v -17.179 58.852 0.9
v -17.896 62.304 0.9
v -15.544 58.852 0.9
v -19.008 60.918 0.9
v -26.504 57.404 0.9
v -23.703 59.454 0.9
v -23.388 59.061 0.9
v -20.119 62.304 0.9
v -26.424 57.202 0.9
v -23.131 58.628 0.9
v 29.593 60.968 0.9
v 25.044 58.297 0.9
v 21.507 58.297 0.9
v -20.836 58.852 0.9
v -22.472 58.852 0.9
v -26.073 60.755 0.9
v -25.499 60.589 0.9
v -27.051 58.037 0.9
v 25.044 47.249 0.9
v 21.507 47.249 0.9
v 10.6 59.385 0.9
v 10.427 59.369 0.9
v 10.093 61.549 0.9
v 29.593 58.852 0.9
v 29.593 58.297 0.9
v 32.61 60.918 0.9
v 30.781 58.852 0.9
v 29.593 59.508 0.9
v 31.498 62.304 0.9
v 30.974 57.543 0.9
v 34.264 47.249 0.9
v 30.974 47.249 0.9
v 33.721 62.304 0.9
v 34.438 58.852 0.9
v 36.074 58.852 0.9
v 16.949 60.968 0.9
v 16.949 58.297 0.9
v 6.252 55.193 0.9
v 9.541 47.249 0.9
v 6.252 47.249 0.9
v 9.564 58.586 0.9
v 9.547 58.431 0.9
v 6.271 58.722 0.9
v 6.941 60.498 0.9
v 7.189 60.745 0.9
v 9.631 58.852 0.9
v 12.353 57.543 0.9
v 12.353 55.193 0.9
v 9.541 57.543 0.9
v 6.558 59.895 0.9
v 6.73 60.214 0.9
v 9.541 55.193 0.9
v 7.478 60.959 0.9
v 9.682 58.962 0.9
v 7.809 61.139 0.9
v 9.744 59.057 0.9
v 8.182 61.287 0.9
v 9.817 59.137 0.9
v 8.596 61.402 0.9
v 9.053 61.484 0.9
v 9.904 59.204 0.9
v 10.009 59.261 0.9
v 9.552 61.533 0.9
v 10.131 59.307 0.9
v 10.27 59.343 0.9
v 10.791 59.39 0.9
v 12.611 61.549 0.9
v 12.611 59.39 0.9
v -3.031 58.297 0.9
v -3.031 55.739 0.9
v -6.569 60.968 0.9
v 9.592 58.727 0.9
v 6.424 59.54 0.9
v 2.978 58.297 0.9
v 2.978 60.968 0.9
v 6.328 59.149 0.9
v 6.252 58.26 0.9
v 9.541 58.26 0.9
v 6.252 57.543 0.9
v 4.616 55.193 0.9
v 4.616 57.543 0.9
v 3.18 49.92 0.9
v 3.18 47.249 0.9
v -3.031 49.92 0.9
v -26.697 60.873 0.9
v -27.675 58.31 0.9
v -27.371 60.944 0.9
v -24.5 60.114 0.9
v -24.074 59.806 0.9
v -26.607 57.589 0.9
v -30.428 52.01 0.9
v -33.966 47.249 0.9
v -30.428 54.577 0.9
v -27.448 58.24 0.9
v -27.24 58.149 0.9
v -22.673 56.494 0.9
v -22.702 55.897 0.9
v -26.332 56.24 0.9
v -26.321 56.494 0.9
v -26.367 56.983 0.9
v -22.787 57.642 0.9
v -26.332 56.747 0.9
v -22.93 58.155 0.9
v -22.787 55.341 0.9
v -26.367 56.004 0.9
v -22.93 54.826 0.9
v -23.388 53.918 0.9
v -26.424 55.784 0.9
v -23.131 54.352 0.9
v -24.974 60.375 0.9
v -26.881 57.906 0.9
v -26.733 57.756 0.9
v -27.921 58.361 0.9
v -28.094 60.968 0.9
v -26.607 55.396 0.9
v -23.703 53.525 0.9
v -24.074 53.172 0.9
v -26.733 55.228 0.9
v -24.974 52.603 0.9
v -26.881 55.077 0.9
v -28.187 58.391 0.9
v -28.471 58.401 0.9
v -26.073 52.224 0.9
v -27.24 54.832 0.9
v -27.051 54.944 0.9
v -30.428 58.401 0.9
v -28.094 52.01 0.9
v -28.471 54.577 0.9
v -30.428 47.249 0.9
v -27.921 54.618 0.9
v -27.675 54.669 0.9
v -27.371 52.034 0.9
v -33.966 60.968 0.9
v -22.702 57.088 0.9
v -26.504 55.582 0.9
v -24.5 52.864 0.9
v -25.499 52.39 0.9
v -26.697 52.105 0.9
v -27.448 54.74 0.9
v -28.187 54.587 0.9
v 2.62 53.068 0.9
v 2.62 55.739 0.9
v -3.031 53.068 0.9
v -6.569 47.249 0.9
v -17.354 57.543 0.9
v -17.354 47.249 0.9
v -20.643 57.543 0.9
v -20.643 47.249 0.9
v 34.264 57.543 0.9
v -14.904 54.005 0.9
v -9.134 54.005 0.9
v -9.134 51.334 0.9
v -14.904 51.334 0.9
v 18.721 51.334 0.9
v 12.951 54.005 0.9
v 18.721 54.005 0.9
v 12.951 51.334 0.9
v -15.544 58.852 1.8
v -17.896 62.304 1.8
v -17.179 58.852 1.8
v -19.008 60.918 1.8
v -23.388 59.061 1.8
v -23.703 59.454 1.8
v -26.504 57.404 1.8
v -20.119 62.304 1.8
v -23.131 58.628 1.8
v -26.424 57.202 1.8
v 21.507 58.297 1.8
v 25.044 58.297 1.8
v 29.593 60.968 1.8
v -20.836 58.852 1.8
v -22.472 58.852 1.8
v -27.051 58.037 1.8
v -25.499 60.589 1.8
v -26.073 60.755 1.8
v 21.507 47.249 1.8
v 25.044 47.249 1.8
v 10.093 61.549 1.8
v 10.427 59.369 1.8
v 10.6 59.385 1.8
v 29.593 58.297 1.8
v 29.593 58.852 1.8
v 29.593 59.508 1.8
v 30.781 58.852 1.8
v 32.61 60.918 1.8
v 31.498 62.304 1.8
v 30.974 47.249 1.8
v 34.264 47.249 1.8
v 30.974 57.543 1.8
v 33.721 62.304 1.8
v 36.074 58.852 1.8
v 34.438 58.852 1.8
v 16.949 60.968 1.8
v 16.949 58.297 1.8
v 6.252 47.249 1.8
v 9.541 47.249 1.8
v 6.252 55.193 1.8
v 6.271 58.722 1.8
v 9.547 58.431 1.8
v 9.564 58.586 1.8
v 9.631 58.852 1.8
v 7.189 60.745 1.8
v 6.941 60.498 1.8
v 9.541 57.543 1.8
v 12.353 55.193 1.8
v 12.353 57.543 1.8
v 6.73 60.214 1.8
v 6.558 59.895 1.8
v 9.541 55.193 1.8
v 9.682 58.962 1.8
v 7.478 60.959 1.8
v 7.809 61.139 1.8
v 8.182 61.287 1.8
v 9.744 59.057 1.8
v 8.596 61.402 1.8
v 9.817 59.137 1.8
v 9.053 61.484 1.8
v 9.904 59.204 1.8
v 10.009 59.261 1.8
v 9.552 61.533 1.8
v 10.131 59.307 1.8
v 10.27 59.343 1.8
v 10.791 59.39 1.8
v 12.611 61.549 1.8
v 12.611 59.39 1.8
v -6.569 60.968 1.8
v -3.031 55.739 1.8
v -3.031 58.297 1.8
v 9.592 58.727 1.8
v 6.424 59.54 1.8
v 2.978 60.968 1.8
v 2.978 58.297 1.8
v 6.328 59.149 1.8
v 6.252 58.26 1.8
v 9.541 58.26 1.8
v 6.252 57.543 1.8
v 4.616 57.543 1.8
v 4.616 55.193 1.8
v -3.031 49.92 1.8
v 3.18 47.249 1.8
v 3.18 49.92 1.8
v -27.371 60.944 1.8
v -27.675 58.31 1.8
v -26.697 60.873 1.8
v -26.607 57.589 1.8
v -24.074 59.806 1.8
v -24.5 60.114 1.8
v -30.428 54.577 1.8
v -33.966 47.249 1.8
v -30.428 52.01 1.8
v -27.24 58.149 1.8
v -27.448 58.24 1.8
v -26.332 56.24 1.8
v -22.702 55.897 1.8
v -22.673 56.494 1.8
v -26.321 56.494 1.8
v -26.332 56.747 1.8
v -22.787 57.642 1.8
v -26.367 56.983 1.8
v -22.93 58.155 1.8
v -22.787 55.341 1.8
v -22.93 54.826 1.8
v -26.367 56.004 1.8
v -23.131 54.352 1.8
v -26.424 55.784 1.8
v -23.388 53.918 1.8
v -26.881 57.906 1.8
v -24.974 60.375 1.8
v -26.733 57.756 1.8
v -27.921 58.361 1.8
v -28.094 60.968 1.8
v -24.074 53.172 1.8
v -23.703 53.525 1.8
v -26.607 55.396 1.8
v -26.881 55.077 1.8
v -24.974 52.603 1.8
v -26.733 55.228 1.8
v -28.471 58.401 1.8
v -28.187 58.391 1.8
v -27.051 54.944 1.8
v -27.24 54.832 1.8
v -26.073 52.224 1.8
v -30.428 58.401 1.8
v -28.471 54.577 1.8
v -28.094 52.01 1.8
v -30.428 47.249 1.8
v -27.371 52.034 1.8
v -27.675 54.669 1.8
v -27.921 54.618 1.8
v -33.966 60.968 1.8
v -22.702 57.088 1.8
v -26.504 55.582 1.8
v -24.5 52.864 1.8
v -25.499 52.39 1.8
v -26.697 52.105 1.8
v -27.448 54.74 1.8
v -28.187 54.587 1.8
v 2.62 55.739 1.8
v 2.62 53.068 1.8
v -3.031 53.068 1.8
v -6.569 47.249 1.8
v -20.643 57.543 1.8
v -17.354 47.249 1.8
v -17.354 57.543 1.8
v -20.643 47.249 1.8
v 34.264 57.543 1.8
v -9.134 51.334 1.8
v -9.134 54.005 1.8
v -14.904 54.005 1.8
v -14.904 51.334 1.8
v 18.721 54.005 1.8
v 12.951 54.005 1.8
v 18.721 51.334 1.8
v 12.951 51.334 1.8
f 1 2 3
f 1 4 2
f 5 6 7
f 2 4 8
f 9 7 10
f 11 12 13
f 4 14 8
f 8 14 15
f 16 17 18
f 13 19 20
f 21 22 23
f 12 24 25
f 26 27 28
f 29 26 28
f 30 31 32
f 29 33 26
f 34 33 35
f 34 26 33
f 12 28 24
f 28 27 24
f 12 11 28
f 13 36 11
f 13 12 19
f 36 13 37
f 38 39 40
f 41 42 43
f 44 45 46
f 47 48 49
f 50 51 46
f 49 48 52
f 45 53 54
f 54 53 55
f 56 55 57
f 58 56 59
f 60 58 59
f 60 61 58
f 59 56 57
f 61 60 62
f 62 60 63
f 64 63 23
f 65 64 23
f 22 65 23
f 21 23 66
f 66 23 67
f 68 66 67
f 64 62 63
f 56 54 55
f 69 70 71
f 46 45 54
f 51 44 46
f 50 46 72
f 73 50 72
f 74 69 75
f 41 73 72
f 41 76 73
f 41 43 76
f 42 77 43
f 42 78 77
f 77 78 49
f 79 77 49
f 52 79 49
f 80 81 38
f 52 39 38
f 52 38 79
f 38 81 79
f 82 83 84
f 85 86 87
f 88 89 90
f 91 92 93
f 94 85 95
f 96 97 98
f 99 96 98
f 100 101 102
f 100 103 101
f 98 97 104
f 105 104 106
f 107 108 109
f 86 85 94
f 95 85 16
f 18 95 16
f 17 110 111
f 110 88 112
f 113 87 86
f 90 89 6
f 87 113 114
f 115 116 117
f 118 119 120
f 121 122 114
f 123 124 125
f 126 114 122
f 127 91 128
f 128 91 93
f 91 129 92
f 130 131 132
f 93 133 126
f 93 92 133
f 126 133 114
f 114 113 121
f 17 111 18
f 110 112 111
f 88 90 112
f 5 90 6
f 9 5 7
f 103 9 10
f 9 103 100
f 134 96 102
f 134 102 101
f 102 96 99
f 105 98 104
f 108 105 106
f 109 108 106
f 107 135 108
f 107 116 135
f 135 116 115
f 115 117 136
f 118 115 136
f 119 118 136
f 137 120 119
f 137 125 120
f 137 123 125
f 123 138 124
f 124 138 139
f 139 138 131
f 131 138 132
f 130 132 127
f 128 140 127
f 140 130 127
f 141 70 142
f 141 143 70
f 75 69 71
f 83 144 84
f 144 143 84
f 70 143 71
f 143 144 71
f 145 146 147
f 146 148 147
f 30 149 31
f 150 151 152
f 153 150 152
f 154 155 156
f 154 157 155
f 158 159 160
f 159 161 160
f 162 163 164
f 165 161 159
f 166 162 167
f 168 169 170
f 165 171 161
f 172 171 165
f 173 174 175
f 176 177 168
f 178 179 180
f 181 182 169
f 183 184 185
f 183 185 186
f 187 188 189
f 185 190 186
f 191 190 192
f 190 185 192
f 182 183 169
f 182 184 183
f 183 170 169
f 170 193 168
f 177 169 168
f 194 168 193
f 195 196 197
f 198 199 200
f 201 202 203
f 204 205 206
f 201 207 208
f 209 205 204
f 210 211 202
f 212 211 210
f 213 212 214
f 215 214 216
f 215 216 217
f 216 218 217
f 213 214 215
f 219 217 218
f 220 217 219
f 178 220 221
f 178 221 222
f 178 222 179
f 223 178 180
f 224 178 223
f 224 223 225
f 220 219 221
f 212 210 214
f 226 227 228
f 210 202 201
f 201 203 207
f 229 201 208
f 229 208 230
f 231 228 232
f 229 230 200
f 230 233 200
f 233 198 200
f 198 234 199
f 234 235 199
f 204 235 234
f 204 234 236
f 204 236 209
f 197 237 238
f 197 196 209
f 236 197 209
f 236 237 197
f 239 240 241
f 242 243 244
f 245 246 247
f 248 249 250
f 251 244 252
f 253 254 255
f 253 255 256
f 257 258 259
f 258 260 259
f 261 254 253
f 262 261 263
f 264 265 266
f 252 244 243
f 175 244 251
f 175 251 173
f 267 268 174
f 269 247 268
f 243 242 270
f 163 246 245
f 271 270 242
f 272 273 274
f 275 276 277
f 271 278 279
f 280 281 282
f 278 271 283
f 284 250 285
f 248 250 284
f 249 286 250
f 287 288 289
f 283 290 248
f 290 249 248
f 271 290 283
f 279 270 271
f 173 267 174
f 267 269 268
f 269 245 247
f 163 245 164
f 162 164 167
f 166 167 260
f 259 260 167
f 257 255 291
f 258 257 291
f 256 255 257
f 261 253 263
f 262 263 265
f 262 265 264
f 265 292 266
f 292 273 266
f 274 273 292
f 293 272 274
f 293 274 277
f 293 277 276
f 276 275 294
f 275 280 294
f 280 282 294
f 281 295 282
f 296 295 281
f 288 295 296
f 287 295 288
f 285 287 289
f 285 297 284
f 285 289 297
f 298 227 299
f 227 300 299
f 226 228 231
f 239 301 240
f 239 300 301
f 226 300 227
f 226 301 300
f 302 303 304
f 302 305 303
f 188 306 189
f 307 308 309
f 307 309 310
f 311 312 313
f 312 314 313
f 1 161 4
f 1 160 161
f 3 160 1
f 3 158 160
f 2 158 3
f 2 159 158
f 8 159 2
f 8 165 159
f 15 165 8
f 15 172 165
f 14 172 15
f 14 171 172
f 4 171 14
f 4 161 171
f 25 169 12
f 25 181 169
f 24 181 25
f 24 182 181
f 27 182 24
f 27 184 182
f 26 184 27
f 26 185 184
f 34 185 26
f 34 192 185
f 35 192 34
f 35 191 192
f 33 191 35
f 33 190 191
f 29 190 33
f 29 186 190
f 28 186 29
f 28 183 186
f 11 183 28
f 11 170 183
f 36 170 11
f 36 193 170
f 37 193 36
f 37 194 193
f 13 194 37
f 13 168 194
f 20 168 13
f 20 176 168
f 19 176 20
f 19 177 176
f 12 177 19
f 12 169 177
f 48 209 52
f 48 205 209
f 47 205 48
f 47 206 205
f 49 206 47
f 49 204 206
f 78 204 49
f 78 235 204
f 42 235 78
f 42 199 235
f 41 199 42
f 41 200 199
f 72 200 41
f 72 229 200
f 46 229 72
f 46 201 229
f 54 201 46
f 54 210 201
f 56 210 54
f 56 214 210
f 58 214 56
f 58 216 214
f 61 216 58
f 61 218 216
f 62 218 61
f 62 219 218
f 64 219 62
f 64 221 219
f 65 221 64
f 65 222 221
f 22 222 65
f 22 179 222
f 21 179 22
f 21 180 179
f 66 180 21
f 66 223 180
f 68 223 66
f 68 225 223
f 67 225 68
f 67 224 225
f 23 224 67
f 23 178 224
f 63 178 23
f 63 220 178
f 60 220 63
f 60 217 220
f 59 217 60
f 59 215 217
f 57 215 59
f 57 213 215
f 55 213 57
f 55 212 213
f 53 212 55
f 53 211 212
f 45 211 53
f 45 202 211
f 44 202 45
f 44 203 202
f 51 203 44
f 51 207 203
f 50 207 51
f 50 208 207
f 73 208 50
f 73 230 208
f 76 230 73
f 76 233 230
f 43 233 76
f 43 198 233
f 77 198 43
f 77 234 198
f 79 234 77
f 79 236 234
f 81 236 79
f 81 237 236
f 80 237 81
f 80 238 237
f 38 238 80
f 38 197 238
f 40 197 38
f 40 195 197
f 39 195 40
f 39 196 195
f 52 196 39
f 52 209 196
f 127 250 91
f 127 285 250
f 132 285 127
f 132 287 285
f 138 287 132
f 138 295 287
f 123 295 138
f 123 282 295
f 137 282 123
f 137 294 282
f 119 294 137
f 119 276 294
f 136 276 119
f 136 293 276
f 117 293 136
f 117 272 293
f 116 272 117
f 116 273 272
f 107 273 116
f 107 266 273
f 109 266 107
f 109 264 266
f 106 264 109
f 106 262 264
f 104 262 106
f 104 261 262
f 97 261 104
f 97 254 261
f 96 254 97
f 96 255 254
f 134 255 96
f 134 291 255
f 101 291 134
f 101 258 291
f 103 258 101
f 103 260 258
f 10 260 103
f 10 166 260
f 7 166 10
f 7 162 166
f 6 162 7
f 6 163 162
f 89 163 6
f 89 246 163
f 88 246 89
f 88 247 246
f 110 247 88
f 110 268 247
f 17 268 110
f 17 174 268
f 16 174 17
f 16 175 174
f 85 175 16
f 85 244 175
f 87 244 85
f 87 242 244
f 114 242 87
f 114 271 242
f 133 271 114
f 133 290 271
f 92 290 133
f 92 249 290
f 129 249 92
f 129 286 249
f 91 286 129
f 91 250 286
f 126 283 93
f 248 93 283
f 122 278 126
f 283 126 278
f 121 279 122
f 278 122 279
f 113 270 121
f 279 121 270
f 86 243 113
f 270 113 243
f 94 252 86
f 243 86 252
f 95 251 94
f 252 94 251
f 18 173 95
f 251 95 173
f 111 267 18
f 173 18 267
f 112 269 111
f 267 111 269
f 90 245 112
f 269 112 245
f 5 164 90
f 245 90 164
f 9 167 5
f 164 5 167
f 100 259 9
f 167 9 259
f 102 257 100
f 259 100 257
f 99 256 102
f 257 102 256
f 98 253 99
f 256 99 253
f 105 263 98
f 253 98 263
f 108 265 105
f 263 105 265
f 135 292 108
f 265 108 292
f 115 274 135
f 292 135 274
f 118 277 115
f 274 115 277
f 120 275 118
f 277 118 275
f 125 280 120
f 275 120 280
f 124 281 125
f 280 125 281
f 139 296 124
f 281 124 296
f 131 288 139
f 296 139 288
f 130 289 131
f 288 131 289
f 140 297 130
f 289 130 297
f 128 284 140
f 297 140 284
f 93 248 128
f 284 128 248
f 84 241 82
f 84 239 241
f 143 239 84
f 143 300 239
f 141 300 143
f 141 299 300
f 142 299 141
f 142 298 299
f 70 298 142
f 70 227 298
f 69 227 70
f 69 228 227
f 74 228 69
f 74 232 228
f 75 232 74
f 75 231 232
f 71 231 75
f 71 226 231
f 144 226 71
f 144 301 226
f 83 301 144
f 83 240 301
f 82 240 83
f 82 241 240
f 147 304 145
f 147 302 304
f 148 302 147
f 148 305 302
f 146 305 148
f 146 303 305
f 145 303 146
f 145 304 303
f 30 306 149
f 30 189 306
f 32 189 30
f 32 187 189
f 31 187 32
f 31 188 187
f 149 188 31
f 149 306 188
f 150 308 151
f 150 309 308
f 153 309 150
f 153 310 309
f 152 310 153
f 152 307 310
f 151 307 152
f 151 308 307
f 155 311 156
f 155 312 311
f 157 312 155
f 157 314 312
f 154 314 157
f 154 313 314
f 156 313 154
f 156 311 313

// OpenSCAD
$fn = 48;
  // transliteration (above top hole)
  translate([0, 54.600, 0.900]) linear_extrude(height=0.900) text("Pî-Ef-Tî", size=13.550, halign="center", valign="center", font="Helvetica Neue:style=Bold");
